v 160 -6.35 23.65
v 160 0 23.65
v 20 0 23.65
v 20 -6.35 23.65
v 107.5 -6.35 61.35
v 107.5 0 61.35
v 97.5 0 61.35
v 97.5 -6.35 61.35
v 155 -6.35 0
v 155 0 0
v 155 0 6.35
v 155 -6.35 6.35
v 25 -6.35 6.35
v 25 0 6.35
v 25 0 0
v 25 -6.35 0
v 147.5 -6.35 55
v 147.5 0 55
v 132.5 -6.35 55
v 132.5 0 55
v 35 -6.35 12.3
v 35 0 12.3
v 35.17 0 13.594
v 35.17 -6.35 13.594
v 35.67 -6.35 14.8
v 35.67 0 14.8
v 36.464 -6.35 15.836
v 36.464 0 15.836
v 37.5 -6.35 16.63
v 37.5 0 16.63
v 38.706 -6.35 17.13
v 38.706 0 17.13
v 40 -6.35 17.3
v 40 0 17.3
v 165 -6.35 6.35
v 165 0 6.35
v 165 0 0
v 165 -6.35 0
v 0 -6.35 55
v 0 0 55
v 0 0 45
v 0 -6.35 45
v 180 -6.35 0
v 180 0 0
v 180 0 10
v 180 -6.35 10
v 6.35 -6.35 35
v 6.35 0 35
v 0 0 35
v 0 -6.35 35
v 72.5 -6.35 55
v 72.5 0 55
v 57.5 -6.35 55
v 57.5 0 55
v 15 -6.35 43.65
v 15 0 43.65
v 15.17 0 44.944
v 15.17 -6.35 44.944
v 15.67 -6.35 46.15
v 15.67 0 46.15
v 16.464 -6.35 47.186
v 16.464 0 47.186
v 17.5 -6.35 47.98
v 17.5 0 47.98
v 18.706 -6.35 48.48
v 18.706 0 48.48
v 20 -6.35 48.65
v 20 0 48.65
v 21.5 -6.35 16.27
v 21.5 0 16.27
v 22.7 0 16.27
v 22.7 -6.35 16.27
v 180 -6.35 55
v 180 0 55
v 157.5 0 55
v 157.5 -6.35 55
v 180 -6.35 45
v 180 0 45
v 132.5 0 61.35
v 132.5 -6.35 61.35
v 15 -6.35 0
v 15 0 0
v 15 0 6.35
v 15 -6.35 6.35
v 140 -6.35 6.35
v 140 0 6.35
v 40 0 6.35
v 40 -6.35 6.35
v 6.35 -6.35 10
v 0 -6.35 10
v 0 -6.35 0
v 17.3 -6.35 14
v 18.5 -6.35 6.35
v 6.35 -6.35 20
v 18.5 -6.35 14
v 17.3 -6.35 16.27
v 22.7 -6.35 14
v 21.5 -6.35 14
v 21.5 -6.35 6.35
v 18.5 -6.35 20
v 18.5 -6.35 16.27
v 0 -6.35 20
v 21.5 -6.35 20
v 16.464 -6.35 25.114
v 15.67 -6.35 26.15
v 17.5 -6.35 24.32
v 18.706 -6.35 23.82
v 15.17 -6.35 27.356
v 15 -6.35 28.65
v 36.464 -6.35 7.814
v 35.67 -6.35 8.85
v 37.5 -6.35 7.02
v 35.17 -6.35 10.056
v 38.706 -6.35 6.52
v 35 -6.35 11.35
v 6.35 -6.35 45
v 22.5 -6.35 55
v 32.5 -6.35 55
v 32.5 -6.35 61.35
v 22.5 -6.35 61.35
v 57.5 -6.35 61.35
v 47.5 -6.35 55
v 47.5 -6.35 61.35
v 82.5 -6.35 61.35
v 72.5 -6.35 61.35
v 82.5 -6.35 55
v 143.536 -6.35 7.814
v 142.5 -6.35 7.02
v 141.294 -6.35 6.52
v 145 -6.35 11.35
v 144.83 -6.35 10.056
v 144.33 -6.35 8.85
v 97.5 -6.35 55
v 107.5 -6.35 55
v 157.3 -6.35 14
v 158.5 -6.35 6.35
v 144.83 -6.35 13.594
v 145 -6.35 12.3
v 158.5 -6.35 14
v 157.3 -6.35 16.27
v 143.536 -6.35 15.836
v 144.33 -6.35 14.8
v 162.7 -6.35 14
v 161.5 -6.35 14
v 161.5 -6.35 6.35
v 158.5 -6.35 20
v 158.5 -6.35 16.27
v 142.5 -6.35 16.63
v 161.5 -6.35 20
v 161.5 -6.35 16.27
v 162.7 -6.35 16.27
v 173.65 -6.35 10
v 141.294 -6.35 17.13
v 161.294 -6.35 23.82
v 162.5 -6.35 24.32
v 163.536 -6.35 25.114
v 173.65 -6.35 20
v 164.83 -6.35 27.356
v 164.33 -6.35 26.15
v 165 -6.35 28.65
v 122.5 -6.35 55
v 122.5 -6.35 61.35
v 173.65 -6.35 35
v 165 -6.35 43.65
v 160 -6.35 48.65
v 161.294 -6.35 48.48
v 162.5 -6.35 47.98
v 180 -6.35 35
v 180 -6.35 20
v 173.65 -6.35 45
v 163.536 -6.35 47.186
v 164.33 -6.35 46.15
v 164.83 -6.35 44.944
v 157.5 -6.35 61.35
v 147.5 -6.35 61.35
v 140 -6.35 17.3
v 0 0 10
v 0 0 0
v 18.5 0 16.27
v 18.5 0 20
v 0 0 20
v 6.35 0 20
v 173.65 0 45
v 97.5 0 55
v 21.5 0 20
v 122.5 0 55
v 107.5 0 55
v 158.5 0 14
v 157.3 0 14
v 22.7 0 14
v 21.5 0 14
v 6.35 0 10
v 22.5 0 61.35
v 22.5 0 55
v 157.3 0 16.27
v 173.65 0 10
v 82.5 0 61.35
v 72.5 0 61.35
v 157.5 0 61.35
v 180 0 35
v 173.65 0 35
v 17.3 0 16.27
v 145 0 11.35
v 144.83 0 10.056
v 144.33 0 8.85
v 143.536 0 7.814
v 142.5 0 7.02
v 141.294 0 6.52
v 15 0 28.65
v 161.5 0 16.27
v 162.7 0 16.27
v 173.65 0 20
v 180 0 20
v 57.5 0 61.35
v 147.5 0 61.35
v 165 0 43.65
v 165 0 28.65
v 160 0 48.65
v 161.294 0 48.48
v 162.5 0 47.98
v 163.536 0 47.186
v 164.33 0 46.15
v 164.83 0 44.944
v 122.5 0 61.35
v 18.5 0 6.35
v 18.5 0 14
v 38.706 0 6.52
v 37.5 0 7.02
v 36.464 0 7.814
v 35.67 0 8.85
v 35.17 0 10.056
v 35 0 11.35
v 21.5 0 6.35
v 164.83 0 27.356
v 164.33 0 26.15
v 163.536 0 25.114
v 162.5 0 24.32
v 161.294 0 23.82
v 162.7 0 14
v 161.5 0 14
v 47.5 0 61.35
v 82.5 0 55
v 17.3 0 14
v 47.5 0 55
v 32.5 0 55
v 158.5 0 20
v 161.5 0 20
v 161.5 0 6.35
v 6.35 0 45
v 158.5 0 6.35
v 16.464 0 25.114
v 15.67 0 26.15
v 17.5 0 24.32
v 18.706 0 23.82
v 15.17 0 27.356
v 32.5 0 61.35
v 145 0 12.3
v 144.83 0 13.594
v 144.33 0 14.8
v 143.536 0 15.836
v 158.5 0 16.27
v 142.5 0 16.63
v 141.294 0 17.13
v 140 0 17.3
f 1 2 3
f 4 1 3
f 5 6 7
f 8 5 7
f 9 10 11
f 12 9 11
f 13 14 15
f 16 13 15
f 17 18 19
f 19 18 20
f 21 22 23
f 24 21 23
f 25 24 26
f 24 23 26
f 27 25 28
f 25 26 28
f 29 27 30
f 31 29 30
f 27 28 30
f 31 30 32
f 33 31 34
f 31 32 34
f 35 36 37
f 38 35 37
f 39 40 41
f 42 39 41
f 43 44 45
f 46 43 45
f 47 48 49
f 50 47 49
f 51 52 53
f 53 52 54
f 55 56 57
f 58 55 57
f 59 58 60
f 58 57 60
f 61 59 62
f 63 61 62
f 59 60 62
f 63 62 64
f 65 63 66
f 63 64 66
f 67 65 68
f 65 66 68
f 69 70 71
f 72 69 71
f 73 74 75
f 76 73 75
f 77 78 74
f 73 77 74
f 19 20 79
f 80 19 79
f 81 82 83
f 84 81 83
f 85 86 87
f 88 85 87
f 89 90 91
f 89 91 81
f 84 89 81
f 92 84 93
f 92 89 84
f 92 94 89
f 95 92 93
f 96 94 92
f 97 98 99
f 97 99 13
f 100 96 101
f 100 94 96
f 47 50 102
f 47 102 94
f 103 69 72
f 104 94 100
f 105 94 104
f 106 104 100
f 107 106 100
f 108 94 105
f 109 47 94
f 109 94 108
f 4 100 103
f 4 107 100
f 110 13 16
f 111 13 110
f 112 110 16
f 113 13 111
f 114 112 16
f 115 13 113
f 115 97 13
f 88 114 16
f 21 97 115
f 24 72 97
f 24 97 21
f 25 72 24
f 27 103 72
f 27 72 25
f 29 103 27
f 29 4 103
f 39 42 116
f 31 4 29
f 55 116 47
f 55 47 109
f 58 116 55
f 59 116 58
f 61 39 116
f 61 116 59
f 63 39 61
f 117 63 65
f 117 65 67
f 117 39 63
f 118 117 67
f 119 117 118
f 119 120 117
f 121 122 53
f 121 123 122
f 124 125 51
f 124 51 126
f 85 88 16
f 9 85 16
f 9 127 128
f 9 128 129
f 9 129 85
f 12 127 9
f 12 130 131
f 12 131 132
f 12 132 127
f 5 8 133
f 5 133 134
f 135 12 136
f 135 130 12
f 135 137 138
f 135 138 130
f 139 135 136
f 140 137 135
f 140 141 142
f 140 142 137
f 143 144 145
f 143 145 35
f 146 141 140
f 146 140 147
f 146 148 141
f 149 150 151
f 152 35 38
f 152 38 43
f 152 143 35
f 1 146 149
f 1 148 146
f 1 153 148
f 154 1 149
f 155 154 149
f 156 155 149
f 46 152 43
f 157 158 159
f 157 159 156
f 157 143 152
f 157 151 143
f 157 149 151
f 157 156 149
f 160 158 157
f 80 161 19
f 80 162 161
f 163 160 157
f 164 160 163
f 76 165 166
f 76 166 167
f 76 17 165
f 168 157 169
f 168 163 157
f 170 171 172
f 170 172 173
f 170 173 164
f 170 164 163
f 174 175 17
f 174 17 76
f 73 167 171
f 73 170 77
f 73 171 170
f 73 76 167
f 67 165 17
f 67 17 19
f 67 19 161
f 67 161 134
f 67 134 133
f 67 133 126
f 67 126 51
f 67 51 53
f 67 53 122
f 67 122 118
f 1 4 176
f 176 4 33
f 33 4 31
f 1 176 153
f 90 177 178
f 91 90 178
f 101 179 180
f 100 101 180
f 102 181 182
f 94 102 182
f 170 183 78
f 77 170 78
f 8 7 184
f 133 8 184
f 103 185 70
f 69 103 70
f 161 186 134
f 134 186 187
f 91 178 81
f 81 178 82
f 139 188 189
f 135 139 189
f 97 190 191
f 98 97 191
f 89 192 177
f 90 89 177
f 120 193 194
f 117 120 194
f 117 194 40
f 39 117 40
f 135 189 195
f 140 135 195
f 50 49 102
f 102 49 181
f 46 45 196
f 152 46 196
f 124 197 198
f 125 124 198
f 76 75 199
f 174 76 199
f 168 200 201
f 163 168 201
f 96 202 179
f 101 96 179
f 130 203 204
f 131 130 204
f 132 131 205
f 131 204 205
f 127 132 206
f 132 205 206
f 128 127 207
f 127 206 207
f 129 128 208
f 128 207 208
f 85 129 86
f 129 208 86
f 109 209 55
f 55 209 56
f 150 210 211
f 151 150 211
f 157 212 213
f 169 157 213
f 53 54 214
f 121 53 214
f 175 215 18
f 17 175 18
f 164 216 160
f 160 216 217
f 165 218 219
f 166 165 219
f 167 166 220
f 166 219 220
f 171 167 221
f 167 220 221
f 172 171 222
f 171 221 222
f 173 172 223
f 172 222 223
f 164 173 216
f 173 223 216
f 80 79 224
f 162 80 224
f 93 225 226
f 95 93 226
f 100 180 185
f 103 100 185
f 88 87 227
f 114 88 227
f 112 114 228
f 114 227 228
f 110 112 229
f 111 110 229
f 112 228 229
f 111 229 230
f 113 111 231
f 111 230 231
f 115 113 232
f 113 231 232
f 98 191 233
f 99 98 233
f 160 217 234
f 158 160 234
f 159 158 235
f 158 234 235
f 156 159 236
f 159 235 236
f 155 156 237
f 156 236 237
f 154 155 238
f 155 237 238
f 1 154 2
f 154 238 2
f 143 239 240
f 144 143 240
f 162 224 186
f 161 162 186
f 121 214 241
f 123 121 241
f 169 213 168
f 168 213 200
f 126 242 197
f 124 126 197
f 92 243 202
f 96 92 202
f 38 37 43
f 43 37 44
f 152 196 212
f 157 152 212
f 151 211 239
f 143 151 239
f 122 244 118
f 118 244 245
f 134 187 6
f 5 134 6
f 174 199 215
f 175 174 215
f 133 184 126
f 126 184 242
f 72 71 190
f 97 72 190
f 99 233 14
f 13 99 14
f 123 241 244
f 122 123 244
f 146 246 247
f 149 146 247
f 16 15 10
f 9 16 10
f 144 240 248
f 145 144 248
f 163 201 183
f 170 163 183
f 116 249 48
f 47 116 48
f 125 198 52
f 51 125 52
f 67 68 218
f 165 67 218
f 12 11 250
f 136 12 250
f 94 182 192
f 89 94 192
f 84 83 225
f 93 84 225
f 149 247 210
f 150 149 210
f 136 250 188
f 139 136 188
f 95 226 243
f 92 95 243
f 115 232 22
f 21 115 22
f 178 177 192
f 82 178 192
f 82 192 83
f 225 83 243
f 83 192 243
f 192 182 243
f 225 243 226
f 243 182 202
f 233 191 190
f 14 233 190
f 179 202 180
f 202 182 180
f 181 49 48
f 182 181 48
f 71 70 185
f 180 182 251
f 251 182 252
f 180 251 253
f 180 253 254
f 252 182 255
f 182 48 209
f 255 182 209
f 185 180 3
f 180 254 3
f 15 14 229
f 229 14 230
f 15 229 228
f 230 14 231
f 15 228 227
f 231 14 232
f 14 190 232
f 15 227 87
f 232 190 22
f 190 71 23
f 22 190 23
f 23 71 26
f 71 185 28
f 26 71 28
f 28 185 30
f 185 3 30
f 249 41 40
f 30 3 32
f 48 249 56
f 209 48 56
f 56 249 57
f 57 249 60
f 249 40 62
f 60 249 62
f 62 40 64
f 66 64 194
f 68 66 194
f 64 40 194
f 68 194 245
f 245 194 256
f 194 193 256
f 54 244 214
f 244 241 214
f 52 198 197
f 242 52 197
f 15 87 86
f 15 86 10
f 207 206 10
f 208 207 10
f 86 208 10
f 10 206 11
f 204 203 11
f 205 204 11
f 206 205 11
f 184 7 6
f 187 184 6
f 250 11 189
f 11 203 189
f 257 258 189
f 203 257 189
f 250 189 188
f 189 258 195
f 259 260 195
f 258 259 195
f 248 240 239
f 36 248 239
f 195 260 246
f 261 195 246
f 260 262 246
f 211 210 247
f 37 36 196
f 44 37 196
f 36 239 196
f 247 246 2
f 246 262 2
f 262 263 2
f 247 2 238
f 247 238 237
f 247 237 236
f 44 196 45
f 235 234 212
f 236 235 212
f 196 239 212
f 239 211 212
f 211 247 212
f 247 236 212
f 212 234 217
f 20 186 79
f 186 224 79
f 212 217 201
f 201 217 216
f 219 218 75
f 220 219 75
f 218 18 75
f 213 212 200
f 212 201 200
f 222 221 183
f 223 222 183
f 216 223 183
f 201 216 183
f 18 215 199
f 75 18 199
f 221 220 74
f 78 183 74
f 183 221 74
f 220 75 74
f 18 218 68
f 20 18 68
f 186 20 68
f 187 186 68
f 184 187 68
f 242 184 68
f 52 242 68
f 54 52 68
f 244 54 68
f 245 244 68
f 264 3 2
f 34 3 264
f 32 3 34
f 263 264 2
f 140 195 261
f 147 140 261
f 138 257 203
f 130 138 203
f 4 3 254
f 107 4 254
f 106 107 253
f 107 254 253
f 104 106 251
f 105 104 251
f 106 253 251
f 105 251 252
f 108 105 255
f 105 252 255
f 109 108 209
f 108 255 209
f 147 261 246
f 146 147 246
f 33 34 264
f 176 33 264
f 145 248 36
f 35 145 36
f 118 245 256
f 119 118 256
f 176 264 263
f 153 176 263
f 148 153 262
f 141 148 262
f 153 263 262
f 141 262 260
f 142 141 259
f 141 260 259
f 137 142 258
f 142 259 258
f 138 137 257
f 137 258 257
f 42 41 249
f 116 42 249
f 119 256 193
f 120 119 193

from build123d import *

# Parameters (mm, degrees)
F1_DEPTH = 6.35


with BuildPart() as f1:
    # F0 (on Front) → F1 (new body)
    with BuildSketch(Plane.XZ):
        Polygon((0, 10), (0, 0), (15, 0), (15, 6.35), (18.5, 6.35), (18.5, 14), (17.3, 14), (17.3, 16.27), (18.5, 16.27), (18.5, 20), (21.5, 20), (21.5, 16.27), (22.7, 16.27), (22.7, 14), (21.5, 14), (21.5, 6.35), (25, 6.35), (25, 0), (155, 0), (155, 6.35), (158.5, 6.35), (158.5, 14), (157.3, 14), (157.3, 16.27), (158.5, 16.27), (158.5, 20), (161.5, 20), (161.5, 16.27), (162.7, 16.27), (162.7, 14), (161.5, 14), (161.5, 6.35), (165, 6.35), (165, 0), (180, 0), (180, 10), (173.65, 10), (173.65, 20), (180, 20), (180, 35), (173.65, 35), (173.65, 45), (180, 45), (180, 55), (157.5, 55), (157.5, 61.35), (147.5, 61.35), (147.5, 55), (132.5, 55), (132.5, 61.35), (122.5, 61.35), (122.5, 55), (107.5, 55), (107.5, 61.35), (97.5, 61.35), (97.5, 55), (82.5, 55), (82.5, 61.35), (72.5, 61.35), (72.5, 55), (57.5, 55), (57.5, 61.35), (47.5, 61.35), (47.5, 55), (32.5, 55), (32.5, 61.35), (22.5, 61.35), (22.5, 55), (0, 55), (0, 45), (6.35, 45), (6.35, 35), (0, 35), (0, 20), (6.35, 20), (6.35, 10), align=None)
        with BuildLine():
            ThreePointArc((35, 12.3), (36.464466, 15.835534), (40, 17.3))
            Line((40, 17.3), (140, 17.3))
            ThreePointArc((140, 17.3), (143.535534, 15.835534), (145, 12.3))
            Line((145, 12.3), (145, 11.35))
            ThreePointArc((145, 11.35), (143.535534, 7.814466), (140, 6.35))
            Line((140, 6.35), (40, 6.35))
            ThreePointArc((40, 6.35), (36.464466, 7.814466), (35, 11.35))
            Line((35, 11.35), (35, 12.3))
        make_face(mode=Mode.SUBTRACT)
        with BuildLine():
            ThreePointArc((15, 43.65), (16.464466, 47.185534), (20, 48.65))
            Line((20, 48.65), (160, 48.65))
            ThreePointArc((160, 48.65), (163.535534, 47.185534), (165, 43.65))
            Line((165, 43.65), (165, 28.65))
            ThreePointArc((165, 28.65), (163.535534, 25.114466), (160, 23.65))
            Line((160, 23.65), (20, 23.65))
            ThreePointArc((20, 23.65), (16.464466, 25.114466), (15, 28.65))
            Line((15, 28.65), (15, 43.65))
        make_face(mode=Mode.SUBTRACT)
    extrude(amount=F1_DEPTH)


solid = f1.part
